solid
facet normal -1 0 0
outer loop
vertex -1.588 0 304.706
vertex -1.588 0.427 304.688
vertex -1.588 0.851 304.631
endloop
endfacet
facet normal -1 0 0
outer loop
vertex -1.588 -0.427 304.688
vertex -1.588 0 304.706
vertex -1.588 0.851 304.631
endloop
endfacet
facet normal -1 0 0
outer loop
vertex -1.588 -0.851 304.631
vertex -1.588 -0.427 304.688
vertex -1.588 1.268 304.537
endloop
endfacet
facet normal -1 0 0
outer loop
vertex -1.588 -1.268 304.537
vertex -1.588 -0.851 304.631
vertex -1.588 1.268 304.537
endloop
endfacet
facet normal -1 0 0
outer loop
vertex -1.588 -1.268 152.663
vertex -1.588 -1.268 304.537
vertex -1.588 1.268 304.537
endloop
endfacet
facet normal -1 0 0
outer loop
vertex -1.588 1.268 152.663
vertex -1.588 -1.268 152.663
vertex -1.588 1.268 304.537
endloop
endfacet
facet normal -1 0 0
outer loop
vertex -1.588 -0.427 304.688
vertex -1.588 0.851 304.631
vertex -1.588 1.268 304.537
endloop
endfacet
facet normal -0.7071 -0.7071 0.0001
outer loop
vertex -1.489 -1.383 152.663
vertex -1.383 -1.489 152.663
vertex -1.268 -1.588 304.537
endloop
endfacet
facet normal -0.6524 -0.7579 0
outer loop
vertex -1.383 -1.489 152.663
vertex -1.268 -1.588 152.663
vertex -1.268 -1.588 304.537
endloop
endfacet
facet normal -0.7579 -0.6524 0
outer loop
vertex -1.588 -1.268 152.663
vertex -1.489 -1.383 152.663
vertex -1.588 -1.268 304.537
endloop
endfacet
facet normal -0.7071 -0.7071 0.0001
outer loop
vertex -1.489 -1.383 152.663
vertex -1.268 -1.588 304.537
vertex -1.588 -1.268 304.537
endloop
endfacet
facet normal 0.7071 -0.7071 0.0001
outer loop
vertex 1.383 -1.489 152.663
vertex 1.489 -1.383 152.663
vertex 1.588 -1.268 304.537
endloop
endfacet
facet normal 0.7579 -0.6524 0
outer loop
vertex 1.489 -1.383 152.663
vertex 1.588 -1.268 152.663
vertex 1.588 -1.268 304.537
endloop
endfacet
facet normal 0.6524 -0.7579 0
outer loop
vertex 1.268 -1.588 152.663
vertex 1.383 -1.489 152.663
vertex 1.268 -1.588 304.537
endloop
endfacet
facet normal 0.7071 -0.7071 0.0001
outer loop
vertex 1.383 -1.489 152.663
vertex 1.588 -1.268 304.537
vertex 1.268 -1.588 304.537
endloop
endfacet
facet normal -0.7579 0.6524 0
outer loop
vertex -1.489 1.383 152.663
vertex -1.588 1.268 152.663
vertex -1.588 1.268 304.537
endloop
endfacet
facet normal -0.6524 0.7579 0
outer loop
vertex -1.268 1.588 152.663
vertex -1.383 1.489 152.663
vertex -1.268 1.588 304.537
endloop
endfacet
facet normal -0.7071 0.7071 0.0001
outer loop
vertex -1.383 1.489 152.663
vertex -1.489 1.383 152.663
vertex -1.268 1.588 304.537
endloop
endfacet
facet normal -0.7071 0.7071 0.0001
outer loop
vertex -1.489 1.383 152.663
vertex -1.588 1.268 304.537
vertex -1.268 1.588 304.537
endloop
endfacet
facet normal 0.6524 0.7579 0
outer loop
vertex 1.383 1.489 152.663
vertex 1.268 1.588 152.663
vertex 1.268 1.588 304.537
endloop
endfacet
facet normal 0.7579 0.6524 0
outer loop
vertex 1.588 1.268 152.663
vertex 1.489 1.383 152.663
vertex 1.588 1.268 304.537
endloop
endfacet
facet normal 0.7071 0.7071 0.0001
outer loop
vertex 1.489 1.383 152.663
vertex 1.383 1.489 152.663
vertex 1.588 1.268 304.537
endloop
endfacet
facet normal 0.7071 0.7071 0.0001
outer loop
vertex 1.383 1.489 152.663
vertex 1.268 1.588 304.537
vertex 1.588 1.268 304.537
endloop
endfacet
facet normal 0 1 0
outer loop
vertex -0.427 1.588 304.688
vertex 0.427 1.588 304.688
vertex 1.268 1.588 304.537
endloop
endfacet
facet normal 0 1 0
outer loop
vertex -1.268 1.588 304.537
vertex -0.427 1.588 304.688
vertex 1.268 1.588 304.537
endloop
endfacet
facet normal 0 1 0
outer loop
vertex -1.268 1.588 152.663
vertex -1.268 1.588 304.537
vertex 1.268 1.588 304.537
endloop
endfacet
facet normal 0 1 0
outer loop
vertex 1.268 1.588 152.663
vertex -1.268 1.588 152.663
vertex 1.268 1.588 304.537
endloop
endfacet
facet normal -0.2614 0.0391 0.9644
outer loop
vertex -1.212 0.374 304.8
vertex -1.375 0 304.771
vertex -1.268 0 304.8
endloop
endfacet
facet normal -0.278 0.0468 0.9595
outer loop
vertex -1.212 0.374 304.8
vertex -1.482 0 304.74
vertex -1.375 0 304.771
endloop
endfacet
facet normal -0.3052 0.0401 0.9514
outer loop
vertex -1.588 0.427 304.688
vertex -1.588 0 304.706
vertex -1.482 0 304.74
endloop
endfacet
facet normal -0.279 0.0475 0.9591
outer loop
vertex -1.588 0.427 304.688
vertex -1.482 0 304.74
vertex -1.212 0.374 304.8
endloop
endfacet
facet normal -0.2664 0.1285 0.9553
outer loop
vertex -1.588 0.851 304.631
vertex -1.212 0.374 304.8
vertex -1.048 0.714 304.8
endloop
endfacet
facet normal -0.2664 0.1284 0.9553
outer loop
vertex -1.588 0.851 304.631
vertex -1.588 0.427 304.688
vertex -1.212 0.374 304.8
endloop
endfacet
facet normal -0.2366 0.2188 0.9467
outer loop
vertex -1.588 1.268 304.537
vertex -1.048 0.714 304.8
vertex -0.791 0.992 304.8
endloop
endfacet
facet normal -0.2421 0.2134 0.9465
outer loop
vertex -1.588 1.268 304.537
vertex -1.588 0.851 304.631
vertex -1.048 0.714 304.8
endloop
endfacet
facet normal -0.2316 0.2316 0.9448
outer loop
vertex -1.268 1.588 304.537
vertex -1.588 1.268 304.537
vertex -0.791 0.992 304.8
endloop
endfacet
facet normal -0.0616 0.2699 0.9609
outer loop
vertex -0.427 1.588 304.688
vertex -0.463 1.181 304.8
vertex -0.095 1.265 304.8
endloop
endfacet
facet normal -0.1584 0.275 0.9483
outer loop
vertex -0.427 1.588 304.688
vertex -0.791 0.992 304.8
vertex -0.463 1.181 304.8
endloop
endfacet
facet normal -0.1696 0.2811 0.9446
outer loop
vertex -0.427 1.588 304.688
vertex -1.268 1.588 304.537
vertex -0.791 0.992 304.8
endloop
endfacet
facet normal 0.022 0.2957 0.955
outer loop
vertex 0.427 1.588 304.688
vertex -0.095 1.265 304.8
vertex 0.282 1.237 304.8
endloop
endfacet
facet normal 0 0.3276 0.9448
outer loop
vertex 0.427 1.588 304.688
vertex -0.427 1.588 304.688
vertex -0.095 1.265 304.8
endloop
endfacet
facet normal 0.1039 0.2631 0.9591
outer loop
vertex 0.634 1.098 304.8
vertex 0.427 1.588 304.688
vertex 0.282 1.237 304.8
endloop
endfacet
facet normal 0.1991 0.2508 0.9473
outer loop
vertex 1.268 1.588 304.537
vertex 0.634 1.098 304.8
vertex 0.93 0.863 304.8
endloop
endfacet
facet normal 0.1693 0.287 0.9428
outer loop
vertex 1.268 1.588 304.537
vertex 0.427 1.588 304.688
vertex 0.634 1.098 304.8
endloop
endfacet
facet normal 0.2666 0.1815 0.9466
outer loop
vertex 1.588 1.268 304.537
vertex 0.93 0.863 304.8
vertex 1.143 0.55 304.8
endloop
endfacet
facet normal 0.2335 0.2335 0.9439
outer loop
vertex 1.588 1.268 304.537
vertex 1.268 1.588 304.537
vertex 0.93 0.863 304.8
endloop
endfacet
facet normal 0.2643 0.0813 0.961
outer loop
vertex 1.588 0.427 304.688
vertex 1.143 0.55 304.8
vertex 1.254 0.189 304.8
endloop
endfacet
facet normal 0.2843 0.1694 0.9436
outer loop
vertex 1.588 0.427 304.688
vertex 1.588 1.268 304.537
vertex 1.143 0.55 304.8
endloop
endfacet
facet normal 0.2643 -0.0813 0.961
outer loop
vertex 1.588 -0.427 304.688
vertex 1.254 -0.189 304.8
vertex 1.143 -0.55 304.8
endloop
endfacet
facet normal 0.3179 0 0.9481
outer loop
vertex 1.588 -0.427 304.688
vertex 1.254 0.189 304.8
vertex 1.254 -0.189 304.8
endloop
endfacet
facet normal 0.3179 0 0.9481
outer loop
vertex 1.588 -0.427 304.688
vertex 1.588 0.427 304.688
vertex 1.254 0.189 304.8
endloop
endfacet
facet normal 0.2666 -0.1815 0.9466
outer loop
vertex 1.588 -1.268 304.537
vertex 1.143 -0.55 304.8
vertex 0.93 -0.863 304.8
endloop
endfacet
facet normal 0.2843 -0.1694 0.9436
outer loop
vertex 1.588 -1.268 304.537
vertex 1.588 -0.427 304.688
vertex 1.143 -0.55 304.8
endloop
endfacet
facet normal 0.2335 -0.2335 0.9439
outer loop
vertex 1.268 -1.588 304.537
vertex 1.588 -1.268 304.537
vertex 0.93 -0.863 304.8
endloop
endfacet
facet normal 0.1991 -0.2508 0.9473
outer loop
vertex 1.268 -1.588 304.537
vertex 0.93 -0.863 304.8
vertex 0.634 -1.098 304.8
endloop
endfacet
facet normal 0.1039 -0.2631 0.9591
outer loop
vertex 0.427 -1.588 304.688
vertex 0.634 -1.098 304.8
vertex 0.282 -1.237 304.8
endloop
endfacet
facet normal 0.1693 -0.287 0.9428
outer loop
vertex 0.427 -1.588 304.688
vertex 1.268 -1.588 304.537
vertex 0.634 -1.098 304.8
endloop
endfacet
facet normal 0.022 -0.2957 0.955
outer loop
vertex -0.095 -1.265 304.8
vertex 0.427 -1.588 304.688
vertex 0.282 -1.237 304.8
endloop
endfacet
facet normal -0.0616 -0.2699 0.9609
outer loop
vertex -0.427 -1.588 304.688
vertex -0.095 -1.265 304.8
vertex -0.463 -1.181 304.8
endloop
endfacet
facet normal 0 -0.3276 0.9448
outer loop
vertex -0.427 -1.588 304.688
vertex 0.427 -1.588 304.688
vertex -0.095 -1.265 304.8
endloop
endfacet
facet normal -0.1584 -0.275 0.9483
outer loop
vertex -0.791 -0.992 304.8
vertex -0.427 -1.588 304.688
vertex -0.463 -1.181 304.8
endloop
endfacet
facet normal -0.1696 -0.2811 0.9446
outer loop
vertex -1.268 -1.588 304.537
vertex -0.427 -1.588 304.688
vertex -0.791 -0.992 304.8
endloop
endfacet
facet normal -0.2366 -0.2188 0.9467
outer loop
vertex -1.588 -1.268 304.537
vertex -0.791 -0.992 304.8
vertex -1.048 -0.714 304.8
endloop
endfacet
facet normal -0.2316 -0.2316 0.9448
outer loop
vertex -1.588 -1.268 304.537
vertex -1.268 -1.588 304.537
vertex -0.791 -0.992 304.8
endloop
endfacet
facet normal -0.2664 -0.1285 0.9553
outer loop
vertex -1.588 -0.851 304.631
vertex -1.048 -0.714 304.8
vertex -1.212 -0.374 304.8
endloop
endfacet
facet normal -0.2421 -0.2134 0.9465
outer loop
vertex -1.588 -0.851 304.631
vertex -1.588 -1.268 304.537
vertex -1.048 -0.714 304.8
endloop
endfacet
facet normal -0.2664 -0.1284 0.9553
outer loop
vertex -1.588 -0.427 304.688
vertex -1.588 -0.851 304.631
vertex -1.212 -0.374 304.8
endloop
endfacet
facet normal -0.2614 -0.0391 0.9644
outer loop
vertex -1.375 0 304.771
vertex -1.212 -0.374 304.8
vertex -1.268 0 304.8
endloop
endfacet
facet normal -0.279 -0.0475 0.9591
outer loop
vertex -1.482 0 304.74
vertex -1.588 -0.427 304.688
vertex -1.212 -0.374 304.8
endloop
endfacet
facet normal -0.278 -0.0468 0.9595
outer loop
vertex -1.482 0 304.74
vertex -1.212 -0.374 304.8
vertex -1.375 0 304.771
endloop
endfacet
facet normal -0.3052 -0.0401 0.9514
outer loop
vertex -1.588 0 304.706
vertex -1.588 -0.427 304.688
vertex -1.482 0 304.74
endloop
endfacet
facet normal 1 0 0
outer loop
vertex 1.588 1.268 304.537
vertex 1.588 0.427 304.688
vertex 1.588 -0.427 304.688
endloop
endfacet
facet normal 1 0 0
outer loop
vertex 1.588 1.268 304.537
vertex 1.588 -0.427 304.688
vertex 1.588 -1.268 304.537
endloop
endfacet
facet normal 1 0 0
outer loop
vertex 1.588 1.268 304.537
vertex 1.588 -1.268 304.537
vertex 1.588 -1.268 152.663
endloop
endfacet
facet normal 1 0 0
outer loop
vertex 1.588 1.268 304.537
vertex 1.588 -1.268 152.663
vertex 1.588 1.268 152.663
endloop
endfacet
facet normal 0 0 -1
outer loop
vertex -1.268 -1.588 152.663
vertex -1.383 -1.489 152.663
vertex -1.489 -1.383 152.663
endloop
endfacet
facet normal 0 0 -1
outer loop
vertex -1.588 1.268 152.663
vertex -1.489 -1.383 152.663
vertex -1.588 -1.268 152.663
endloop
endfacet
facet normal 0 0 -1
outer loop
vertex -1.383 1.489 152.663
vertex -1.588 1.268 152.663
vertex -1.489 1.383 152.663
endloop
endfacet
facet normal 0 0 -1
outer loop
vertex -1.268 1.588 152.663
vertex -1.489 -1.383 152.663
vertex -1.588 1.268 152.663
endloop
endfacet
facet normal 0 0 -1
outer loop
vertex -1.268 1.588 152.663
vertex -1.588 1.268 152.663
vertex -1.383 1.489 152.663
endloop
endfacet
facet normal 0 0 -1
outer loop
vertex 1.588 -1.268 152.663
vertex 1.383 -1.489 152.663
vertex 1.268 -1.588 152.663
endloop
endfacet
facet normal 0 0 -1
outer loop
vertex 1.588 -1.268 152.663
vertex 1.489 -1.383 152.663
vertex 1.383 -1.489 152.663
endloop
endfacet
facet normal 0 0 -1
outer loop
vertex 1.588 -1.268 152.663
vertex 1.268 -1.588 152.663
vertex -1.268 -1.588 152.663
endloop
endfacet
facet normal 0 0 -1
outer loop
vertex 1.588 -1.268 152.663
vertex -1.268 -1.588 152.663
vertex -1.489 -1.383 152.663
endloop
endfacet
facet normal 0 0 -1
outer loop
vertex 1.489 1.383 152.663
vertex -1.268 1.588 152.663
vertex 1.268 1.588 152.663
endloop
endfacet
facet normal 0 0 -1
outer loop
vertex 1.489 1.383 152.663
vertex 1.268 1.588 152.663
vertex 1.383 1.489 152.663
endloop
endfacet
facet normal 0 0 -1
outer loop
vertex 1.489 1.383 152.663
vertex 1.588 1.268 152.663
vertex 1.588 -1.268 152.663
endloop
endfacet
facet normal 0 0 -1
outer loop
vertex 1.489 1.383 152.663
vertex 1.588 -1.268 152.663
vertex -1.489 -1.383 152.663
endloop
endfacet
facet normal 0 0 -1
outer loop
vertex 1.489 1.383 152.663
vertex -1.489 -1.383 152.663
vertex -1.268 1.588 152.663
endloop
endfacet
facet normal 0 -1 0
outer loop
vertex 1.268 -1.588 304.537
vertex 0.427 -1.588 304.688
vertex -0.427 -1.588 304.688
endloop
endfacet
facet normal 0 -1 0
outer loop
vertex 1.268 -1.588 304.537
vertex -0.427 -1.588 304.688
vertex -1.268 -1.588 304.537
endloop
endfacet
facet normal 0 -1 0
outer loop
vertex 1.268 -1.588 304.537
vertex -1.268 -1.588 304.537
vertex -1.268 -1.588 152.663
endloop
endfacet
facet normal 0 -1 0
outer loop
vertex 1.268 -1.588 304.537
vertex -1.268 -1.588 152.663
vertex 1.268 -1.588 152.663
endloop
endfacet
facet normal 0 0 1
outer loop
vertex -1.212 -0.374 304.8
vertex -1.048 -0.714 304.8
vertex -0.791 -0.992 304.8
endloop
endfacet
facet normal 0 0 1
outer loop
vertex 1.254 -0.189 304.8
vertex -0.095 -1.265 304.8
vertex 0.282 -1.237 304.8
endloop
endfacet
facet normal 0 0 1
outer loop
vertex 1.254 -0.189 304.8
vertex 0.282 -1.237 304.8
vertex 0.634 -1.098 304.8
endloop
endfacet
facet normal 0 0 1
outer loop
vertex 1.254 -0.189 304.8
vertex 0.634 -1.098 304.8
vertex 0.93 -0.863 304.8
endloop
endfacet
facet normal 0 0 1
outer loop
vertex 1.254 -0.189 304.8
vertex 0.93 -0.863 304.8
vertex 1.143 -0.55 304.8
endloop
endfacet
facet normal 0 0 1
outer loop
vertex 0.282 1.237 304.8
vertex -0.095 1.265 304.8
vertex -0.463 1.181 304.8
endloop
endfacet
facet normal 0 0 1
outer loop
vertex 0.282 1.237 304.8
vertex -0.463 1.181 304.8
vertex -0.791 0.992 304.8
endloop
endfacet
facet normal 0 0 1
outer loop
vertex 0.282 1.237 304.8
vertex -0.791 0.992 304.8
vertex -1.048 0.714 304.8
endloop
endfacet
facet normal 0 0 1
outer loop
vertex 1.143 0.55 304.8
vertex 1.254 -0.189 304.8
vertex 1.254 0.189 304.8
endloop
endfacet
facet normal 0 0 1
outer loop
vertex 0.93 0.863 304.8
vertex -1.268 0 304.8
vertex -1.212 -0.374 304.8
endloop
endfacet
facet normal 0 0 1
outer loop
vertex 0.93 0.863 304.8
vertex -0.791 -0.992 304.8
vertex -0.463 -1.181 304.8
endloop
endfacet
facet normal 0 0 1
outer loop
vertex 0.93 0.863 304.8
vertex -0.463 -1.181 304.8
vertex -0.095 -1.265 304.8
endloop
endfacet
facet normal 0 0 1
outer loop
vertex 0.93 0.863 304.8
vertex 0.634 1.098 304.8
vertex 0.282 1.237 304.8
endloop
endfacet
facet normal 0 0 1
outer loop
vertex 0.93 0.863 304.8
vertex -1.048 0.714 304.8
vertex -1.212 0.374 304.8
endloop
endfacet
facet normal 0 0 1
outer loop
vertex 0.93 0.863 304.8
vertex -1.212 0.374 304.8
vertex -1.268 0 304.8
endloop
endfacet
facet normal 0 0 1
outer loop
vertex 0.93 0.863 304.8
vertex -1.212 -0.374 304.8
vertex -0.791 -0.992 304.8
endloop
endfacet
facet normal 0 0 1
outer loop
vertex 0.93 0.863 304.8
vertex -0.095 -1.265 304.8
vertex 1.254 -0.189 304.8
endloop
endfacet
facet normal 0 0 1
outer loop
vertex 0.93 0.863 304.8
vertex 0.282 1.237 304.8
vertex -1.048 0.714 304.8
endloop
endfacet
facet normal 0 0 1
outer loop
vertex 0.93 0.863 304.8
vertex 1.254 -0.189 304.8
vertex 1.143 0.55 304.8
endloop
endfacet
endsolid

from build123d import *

# Parameters (mm, degrees)
SKETCH1_W           = 3.175
SKETCH1_H           = 3.175
BOSS_EXTRUDE1_DEPTH = 152.4
SKETCH2_OUTSIDE_W   = 35.668
SKETCH2_OUTSIDE_H   = 35.668
SKETCH2_OUTSIDE_R   = 2.032
CUT_EXTRUDE1_DEPTH  = 153.416535561
SKETCH4_W           = 152.4
SKETCH4_H           = 3.175
CUT_EXTRUDE3_DEPTH  = 305.820669872


with BuildPart() as part:
    # Sketch1 → Boss-Extrude1 (new body)
    with BuildSketch(Plane.XY):
        Rectangle(SKETCH1_W, SKETCH1_H)
    extrude(amount=BOSS_EXTRUDE1_DEPTH)

    # Sketch2 outside → Cut-Extrude1 (cut, through all)
    with BuildSketch(Plane(origin=(0, 0, 0), x_dir=(-1, 0, 0), z_dir=(0, 0, -1))):
        Rectangle(SKETCH2_OUTSIDE_W, SKETCH2_OUTSIDE_H)
        Circle(SKETCH2_OUTSIDE_R, mode=Mode.SUBTRACT)
    extrude(amount=-CUT_EXTRUDE1_DEPTH, mode=Mode.SUBTRACT)

    # Sketch3 → Cut-Revolve1 (revolve, cut)
    with BuildSketch(Plane(origin=(0, 0, 0), x_dir=(1, 0, 0), z_dir=(0, 1, 0))):
        with BuildLine():
            Line((-5.053685963, -4.40273269), (-5.053685963, 5.740530545))
            Line((-5.053685963, 5.740530545), (0, 5.740530545))
            Line((0, 5.740530545), (0, 0.160877736))
            ThreePointArc((0, 0.160877736), (-3.404639553, -1.148866368), (-5.053685963, -4.40273269))
        make_face()
    revolve(axis=Axis((0, 0, 152.4), (0, 0, -1)), mode=Mode.SUBTRACT)

    # Mirror1: part across plane


with BuildPart() as part_1:
    add(part.part)
    add(part.part.mirror(Plane(origin=(0, 0, 152.4), x_dir=(1, 0, 0), z_dir=(0, 0, -1))))

    # Sketch4 → Cut-Extrude3 (cut, through all)
    with BuildSketch(Plane(origin=(1.5875, 0, 0), x_dir=(0, 0, -1), z_dir=(1, 0, 0))):
        with Locations((-76.463225358, 0)):
            Rectangle(SKETCH4_W, SKETCH4_H)
    extrude(amount=-CUT_EXTRUDE3_DEPTH, mode=Mode.SUBTRACT)


with BuildPart() as body_2:
    # of the pieces the cut leaves, the one that is kept (cut_extrude3_keep)
    add(part_1.part.solids().sort_by_distance((1.268411507, -1.5875, 152.663225358))[0])


solid = body_2.part
